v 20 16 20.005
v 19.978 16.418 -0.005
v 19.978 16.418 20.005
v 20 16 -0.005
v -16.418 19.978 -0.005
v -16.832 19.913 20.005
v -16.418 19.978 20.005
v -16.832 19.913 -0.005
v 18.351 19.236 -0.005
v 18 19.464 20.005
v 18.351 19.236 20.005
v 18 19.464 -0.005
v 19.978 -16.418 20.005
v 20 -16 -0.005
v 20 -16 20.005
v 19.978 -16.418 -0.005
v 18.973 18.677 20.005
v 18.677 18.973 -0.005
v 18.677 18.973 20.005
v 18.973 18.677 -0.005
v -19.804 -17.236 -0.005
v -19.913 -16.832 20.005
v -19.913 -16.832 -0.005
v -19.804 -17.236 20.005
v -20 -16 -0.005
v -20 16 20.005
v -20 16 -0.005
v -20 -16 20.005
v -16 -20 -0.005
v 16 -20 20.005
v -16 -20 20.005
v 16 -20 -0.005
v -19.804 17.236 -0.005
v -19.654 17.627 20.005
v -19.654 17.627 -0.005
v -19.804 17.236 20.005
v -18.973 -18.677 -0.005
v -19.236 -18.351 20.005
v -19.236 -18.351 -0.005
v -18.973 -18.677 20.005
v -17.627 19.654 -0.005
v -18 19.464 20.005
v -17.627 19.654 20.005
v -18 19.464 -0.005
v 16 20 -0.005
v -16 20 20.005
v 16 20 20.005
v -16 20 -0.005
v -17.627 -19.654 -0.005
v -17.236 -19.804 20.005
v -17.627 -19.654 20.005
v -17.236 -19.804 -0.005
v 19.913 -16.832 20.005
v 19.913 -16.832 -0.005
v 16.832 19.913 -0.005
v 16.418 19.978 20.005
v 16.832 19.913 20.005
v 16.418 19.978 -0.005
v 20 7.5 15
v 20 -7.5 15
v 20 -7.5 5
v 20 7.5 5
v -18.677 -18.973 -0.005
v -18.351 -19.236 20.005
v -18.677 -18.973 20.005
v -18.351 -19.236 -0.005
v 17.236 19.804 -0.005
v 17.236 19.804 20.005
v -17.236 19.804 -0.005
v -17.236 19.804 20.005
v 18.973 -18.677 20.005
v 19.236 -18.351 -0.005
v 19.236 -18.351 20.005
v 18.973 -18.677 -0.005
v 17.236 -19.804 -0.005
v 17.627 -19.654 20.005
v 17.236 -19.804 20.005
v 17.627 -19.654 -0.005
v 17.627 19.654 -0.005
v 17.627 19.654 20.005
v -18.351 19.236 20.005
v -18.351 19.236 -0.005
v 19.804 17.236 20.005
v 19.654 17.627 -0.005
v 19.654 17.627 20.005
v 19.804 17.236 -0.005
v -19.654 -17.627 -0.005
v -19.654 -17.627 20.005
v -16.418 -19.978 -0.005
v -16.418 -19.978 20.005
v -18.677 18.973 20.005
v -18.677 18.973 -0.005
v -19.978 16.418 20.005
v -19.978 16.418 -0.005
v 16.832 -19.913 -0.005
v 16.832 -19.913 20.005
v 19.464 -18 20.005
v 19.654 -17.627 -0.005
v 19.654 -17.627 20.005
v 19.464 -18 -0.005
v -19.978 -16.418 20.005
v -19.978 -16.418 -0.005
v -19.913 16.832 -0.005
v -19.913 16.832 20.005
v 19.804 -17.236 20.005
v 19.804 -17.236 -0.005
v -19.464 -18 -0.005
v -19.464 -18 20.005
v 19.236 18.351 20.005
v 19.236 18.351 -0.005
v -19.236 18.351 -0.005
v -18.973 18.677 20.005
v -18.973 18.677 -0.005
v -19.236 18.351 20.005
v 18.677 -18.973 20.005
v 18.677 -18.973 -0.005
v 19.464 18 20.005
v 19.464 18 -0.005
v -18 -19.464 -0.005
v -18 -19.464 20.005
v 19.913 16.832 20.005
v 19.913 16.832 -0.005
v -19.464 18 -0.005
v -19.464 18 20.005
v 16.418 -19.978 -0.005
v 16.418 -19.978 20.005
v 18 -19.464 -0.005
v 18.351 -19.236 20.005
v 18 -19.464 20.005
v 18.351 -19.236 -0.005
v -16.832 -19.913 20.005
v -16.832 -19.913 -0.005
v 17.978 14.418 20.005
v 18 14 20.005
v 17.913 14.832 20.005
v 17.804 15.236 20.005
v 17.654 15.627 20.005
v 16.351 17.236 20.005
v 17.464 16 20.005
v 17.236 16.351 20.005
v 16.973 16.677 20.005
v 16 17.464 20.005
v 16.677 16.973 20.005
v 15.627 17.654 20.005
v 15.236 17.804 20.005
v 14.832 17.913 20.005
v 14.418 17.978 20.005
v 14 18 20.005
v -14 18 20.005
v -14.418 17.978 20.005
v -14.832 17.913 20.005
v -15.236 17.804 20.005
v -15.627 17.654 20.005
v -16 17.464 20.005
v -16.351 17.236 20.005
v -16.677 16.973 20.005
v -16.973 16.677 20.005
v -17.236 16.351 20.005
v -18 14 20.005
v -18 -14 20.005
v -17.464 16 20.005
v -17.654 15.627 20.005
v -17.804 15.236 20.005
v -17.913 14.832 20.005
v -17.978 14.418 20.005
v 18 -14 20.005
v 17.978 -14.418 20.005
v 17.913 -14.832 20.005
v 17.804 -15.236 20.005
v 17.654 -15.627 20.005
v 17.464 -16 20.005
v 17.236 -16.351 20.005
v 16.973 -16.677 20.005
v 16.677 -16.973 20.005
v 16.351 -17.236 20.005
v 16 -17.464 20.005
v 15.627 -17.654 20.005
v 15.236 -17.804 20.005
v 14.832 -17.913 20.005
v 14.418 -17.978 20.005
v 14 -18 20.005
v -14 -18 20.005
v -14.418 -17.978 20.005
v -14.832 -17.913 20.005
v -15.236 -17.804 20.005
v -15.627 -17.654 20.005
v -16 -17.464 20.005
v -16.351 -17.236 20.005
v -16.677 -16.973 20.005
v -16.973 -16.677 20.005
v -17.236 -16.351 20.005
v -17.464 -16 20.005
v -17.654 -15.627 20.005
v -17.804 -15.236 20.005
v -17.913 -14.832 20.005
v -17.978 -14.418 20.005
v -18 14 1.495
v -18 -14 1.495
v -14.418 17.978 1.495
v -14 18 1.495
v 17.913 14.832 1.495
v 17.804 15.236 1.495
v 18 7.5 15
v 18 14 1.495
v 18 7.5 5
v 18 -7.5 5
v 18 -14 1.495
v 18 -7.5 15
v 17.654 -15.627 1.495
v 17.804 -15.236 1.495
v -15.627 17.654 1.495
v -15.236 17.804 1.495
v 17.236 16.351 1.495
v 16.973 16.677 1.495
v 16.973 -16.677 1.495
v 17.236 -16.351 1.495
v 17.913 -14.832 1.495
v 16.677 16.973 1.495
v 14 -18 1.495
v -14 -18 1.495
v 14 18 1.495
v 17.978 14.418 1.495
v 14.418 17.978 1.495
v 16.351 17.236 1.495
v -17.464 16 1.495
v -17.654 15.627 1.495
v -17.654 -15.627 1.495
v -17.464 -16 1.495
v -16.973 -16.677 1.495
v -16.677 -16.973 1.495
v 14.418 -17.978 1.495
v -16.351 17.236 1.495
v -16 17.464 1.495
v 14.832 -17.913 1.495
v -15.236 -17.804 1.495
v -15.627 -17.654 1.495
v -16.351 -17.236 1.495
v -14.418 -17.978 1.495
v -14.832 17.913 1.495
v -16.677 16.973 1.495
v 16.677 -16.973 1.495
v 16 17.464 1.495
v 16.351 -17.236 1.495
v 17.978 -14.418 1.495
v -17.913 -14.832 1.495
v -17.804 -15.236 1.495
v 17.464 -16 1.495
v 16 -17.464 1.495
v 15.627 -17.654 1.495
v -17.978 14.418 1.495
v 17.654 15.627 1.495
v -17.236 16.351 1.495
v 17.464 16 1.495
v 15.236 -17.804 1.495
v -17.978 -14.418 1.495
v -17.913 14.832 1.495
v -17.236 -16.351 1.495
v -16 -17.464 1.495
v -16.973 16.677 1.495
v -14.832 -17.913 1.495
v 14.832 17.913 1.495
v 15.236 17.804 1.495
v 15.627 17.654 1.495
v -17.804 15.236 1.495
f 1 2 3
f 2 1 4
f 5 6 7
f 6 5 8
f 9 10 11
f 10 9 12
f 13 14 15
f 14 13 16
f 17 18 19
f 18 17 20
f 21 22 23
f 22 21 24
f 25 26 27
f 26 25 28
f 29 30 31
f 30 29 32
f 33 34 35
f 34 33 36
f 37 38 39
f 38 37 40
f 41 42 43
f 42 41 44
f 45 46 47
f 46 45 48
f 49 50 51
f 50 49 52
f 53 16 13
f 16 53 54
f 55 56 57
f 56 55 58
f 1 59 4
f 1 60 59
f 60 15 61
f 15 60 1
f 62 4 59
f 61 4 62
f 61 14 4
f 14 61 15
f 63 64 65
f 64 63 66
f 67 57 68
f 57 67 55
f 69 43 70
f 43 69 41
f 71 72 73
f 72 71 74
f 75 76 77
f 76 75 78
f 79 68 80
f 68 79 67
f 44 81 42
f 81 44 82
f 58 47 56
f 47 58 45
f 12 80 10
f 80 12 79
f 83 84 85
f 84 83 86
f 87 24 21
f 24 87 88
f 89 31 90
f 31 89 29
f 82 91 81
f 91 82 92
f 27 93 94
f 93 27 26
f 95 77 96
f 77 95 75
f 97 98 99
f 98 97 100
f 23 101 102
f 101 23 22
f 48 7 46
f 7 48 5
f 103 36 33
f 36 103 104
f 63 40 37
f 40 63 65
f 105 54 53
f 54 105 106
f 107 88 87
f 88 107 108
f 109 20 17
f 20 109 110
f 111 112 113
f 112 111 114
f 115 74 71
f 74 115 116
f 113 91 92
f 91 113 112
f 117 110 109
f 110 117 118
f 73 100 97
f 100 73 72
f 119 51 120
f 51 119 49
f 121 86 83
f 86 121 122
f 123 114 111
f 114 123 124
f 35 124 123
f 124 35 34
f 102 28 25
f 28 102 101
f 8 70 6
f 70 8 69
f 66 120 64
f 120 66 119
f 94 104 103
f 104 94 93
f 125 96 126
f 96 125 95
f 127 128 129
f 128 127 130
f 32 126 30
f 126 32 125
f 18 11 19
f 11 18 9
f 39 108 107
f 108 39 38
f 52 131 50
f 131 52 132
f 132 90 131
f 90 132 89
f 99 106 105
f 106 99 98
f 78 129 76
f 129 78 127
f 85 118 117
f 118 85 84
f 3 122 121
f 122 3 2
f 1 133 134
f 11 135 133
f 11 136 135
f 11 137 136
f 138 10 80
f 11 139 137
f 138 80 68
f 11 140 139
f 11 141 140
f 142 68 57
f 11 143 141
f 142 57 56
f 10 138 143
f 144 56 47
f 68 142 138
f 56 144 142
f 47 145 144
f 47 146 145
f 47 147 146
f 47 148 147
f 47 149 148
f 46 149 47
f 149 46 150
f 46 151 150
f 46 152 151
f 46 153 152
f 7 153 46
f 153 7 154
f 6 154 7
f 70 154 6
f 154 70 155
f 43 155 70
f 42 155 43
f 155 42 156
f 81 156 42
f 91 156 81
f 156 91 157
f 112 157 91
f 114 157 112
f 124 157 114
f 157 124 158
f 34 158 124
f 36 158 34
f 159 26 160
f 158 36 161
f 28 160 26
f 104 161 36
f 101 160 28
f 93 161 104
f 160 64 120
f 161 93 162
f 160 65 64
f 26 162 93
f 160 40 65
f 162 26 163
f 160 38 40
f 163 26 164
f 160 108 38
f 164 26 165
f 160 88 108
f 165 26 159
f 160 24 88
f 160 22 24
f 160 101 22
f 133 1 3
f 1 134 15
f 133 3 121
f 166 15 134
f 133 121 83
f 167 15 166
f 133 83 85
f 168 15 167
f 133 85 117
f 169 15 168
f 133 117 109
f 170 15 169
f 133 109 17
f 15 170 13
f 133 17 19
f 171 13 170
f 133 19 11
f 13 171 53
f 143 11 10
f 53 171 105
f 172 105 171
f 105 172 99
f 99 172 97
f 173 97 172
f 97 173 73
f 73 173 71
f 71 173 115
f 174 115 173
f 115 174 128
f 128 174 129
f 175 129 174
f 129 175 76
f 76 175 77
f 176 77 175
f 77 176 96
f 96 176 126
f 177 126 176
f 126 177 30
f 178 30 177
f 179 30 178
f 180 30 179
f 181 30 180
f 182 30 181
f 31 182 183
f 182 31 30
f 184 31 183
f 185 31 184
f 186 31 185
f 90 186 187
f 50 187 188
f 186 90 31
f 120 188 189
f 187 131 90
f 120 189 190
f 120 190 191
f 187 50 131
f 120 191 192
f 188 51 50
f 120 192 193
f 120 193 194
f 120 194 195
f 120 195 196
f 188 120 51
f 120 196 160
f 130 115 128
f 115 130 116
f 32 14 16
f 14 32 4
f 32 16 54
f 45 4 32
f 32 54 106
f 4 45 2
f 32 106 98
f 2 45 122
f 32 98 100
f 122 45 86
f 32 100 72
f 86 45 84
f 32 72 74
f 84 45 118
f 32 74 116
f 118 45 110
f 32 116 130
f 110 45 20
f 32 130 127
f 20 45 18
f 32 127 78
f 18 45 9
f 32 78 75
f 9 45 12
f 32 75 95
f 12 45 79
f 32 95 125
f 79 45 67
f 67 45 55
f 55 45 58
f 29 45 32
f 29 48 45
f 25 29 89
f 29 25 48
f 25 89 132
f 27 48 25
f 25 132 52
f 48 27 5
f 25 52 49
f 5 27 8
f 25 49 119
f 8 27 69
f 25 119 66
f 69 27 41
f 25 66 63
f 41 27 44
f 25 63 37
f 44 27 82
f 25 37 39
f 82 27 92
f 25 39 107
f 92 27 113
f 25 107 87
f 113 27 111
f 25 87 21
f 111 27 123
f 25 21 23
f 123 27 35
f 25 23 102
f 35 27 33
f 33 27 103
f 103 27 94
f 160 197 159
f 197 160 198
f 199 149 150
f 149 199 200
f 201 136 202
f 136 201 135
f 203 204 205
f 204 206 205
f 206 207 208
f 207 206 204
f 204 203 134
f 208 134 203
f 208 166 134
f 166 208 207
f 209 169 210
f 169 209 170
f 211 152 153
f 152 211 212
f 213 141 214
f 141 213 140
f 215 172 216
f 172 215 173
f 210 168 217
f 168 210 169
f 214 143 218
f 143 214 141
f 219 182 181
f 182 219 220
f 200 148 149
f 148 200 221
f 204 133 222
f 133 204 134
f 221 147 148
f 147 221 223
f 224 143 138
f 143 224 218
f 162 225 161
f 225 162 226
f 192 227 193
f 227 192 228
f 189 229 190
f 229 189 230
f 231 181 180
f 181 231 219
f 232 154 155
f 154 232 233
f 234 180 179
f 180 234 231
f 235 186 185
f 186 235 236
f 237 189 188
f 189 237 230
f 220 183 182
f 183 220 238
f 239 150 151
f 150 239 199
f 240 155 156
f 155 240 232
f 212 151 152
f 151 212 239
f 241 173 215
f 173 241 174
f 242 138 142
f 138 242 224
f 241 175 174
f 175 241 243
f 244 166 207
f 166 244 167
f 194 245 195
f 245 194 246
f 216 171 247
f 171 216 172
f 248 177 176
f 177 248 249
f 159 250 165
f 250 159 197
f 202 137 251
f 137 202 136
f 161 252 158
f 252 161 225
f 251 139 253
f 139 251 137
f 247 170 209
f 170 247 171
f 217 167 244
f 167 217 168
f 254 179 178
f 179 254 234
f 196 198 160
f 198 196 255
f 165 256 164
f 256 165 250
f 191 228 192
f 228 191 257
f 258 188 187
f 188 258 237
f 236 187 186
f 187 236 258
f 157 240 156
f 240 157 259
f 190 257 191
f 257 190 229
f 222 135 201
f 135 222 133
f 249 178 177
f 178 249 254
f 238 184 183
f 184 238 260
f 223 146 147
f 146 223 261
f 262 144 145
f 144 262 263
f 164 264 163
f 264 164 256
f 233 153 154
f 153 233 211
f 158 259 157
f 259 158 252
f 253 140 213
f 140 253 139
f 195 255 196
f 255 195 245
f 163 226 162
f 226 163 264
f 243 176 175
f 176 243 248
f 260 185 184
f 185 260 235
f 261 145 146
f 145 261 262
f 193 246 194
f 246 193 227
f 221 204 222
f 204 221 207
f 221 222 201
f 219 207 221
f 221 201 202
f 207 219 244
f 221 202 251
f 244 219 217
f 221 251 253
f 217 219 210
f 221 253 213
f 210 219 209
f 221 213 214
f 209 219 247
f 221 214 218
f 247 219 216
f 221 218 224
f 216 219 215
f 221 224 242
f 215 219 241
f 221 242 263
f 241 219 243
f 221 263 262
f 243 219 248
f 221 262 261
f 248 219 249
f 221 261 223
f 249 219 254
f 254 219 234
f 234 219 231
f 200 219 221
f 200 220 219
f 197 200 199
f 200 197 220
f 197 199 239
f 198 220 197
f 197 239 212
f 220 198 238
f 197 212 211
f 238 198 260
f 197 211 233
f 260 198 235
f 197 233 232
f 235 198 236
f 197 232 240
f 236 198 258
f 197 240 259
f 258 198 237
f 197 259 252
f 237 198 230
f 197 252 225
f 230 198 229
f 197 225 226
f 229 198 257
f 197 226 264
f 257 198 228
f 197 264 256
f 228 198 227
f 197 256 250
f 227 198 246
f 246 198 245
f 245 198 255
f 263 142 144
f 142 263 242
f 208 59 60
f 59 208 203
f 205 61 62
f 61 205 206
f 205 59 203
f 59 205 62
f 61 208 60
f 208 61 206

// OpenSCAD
// basic enclosure
$fn = 60;

width = 40;   // x
length = 40;  // y
height = 20;  // z
cornerRadius = 4;
wallThickness = 4;

// main enclosure
translate([0,0,height/2]){
  difference(){
    roundedBox(length, width, height, cornerRadius); 

    // cut off top
    translate([0,0,1]){
      roundedBox(length-wallThickness, width-wallThickness, height-1, cornerRadius); 
    }

    // cut out OLED slot
    translate([width/2,0,0]){
      cube([10,15,10], center=true);
    }
  }
}

// lid
// translate([width*2,10,0]){
//   roundedBox(length, width, 1, cornerRadius);

//   // hollow out
//   difference() {
//     translate([1,1,0]){
//       roundedBox(length-2, width-2, 4, cornerRadius);
//     }
//     translate([2,2,0]){
//       roundedBox(length-4, width-4, 6, cornerRadius);
//     }    
//   }
// }

// base slab to work with
module roundedBox(length, width, height, radius){
  dRadius = 2 * radius;

  minkowski(){
    cube(size=[width-dRadius, length-dRadius, height], center=true);
    cylinder(r=radius, h=0.01, center=true);
  }
}
